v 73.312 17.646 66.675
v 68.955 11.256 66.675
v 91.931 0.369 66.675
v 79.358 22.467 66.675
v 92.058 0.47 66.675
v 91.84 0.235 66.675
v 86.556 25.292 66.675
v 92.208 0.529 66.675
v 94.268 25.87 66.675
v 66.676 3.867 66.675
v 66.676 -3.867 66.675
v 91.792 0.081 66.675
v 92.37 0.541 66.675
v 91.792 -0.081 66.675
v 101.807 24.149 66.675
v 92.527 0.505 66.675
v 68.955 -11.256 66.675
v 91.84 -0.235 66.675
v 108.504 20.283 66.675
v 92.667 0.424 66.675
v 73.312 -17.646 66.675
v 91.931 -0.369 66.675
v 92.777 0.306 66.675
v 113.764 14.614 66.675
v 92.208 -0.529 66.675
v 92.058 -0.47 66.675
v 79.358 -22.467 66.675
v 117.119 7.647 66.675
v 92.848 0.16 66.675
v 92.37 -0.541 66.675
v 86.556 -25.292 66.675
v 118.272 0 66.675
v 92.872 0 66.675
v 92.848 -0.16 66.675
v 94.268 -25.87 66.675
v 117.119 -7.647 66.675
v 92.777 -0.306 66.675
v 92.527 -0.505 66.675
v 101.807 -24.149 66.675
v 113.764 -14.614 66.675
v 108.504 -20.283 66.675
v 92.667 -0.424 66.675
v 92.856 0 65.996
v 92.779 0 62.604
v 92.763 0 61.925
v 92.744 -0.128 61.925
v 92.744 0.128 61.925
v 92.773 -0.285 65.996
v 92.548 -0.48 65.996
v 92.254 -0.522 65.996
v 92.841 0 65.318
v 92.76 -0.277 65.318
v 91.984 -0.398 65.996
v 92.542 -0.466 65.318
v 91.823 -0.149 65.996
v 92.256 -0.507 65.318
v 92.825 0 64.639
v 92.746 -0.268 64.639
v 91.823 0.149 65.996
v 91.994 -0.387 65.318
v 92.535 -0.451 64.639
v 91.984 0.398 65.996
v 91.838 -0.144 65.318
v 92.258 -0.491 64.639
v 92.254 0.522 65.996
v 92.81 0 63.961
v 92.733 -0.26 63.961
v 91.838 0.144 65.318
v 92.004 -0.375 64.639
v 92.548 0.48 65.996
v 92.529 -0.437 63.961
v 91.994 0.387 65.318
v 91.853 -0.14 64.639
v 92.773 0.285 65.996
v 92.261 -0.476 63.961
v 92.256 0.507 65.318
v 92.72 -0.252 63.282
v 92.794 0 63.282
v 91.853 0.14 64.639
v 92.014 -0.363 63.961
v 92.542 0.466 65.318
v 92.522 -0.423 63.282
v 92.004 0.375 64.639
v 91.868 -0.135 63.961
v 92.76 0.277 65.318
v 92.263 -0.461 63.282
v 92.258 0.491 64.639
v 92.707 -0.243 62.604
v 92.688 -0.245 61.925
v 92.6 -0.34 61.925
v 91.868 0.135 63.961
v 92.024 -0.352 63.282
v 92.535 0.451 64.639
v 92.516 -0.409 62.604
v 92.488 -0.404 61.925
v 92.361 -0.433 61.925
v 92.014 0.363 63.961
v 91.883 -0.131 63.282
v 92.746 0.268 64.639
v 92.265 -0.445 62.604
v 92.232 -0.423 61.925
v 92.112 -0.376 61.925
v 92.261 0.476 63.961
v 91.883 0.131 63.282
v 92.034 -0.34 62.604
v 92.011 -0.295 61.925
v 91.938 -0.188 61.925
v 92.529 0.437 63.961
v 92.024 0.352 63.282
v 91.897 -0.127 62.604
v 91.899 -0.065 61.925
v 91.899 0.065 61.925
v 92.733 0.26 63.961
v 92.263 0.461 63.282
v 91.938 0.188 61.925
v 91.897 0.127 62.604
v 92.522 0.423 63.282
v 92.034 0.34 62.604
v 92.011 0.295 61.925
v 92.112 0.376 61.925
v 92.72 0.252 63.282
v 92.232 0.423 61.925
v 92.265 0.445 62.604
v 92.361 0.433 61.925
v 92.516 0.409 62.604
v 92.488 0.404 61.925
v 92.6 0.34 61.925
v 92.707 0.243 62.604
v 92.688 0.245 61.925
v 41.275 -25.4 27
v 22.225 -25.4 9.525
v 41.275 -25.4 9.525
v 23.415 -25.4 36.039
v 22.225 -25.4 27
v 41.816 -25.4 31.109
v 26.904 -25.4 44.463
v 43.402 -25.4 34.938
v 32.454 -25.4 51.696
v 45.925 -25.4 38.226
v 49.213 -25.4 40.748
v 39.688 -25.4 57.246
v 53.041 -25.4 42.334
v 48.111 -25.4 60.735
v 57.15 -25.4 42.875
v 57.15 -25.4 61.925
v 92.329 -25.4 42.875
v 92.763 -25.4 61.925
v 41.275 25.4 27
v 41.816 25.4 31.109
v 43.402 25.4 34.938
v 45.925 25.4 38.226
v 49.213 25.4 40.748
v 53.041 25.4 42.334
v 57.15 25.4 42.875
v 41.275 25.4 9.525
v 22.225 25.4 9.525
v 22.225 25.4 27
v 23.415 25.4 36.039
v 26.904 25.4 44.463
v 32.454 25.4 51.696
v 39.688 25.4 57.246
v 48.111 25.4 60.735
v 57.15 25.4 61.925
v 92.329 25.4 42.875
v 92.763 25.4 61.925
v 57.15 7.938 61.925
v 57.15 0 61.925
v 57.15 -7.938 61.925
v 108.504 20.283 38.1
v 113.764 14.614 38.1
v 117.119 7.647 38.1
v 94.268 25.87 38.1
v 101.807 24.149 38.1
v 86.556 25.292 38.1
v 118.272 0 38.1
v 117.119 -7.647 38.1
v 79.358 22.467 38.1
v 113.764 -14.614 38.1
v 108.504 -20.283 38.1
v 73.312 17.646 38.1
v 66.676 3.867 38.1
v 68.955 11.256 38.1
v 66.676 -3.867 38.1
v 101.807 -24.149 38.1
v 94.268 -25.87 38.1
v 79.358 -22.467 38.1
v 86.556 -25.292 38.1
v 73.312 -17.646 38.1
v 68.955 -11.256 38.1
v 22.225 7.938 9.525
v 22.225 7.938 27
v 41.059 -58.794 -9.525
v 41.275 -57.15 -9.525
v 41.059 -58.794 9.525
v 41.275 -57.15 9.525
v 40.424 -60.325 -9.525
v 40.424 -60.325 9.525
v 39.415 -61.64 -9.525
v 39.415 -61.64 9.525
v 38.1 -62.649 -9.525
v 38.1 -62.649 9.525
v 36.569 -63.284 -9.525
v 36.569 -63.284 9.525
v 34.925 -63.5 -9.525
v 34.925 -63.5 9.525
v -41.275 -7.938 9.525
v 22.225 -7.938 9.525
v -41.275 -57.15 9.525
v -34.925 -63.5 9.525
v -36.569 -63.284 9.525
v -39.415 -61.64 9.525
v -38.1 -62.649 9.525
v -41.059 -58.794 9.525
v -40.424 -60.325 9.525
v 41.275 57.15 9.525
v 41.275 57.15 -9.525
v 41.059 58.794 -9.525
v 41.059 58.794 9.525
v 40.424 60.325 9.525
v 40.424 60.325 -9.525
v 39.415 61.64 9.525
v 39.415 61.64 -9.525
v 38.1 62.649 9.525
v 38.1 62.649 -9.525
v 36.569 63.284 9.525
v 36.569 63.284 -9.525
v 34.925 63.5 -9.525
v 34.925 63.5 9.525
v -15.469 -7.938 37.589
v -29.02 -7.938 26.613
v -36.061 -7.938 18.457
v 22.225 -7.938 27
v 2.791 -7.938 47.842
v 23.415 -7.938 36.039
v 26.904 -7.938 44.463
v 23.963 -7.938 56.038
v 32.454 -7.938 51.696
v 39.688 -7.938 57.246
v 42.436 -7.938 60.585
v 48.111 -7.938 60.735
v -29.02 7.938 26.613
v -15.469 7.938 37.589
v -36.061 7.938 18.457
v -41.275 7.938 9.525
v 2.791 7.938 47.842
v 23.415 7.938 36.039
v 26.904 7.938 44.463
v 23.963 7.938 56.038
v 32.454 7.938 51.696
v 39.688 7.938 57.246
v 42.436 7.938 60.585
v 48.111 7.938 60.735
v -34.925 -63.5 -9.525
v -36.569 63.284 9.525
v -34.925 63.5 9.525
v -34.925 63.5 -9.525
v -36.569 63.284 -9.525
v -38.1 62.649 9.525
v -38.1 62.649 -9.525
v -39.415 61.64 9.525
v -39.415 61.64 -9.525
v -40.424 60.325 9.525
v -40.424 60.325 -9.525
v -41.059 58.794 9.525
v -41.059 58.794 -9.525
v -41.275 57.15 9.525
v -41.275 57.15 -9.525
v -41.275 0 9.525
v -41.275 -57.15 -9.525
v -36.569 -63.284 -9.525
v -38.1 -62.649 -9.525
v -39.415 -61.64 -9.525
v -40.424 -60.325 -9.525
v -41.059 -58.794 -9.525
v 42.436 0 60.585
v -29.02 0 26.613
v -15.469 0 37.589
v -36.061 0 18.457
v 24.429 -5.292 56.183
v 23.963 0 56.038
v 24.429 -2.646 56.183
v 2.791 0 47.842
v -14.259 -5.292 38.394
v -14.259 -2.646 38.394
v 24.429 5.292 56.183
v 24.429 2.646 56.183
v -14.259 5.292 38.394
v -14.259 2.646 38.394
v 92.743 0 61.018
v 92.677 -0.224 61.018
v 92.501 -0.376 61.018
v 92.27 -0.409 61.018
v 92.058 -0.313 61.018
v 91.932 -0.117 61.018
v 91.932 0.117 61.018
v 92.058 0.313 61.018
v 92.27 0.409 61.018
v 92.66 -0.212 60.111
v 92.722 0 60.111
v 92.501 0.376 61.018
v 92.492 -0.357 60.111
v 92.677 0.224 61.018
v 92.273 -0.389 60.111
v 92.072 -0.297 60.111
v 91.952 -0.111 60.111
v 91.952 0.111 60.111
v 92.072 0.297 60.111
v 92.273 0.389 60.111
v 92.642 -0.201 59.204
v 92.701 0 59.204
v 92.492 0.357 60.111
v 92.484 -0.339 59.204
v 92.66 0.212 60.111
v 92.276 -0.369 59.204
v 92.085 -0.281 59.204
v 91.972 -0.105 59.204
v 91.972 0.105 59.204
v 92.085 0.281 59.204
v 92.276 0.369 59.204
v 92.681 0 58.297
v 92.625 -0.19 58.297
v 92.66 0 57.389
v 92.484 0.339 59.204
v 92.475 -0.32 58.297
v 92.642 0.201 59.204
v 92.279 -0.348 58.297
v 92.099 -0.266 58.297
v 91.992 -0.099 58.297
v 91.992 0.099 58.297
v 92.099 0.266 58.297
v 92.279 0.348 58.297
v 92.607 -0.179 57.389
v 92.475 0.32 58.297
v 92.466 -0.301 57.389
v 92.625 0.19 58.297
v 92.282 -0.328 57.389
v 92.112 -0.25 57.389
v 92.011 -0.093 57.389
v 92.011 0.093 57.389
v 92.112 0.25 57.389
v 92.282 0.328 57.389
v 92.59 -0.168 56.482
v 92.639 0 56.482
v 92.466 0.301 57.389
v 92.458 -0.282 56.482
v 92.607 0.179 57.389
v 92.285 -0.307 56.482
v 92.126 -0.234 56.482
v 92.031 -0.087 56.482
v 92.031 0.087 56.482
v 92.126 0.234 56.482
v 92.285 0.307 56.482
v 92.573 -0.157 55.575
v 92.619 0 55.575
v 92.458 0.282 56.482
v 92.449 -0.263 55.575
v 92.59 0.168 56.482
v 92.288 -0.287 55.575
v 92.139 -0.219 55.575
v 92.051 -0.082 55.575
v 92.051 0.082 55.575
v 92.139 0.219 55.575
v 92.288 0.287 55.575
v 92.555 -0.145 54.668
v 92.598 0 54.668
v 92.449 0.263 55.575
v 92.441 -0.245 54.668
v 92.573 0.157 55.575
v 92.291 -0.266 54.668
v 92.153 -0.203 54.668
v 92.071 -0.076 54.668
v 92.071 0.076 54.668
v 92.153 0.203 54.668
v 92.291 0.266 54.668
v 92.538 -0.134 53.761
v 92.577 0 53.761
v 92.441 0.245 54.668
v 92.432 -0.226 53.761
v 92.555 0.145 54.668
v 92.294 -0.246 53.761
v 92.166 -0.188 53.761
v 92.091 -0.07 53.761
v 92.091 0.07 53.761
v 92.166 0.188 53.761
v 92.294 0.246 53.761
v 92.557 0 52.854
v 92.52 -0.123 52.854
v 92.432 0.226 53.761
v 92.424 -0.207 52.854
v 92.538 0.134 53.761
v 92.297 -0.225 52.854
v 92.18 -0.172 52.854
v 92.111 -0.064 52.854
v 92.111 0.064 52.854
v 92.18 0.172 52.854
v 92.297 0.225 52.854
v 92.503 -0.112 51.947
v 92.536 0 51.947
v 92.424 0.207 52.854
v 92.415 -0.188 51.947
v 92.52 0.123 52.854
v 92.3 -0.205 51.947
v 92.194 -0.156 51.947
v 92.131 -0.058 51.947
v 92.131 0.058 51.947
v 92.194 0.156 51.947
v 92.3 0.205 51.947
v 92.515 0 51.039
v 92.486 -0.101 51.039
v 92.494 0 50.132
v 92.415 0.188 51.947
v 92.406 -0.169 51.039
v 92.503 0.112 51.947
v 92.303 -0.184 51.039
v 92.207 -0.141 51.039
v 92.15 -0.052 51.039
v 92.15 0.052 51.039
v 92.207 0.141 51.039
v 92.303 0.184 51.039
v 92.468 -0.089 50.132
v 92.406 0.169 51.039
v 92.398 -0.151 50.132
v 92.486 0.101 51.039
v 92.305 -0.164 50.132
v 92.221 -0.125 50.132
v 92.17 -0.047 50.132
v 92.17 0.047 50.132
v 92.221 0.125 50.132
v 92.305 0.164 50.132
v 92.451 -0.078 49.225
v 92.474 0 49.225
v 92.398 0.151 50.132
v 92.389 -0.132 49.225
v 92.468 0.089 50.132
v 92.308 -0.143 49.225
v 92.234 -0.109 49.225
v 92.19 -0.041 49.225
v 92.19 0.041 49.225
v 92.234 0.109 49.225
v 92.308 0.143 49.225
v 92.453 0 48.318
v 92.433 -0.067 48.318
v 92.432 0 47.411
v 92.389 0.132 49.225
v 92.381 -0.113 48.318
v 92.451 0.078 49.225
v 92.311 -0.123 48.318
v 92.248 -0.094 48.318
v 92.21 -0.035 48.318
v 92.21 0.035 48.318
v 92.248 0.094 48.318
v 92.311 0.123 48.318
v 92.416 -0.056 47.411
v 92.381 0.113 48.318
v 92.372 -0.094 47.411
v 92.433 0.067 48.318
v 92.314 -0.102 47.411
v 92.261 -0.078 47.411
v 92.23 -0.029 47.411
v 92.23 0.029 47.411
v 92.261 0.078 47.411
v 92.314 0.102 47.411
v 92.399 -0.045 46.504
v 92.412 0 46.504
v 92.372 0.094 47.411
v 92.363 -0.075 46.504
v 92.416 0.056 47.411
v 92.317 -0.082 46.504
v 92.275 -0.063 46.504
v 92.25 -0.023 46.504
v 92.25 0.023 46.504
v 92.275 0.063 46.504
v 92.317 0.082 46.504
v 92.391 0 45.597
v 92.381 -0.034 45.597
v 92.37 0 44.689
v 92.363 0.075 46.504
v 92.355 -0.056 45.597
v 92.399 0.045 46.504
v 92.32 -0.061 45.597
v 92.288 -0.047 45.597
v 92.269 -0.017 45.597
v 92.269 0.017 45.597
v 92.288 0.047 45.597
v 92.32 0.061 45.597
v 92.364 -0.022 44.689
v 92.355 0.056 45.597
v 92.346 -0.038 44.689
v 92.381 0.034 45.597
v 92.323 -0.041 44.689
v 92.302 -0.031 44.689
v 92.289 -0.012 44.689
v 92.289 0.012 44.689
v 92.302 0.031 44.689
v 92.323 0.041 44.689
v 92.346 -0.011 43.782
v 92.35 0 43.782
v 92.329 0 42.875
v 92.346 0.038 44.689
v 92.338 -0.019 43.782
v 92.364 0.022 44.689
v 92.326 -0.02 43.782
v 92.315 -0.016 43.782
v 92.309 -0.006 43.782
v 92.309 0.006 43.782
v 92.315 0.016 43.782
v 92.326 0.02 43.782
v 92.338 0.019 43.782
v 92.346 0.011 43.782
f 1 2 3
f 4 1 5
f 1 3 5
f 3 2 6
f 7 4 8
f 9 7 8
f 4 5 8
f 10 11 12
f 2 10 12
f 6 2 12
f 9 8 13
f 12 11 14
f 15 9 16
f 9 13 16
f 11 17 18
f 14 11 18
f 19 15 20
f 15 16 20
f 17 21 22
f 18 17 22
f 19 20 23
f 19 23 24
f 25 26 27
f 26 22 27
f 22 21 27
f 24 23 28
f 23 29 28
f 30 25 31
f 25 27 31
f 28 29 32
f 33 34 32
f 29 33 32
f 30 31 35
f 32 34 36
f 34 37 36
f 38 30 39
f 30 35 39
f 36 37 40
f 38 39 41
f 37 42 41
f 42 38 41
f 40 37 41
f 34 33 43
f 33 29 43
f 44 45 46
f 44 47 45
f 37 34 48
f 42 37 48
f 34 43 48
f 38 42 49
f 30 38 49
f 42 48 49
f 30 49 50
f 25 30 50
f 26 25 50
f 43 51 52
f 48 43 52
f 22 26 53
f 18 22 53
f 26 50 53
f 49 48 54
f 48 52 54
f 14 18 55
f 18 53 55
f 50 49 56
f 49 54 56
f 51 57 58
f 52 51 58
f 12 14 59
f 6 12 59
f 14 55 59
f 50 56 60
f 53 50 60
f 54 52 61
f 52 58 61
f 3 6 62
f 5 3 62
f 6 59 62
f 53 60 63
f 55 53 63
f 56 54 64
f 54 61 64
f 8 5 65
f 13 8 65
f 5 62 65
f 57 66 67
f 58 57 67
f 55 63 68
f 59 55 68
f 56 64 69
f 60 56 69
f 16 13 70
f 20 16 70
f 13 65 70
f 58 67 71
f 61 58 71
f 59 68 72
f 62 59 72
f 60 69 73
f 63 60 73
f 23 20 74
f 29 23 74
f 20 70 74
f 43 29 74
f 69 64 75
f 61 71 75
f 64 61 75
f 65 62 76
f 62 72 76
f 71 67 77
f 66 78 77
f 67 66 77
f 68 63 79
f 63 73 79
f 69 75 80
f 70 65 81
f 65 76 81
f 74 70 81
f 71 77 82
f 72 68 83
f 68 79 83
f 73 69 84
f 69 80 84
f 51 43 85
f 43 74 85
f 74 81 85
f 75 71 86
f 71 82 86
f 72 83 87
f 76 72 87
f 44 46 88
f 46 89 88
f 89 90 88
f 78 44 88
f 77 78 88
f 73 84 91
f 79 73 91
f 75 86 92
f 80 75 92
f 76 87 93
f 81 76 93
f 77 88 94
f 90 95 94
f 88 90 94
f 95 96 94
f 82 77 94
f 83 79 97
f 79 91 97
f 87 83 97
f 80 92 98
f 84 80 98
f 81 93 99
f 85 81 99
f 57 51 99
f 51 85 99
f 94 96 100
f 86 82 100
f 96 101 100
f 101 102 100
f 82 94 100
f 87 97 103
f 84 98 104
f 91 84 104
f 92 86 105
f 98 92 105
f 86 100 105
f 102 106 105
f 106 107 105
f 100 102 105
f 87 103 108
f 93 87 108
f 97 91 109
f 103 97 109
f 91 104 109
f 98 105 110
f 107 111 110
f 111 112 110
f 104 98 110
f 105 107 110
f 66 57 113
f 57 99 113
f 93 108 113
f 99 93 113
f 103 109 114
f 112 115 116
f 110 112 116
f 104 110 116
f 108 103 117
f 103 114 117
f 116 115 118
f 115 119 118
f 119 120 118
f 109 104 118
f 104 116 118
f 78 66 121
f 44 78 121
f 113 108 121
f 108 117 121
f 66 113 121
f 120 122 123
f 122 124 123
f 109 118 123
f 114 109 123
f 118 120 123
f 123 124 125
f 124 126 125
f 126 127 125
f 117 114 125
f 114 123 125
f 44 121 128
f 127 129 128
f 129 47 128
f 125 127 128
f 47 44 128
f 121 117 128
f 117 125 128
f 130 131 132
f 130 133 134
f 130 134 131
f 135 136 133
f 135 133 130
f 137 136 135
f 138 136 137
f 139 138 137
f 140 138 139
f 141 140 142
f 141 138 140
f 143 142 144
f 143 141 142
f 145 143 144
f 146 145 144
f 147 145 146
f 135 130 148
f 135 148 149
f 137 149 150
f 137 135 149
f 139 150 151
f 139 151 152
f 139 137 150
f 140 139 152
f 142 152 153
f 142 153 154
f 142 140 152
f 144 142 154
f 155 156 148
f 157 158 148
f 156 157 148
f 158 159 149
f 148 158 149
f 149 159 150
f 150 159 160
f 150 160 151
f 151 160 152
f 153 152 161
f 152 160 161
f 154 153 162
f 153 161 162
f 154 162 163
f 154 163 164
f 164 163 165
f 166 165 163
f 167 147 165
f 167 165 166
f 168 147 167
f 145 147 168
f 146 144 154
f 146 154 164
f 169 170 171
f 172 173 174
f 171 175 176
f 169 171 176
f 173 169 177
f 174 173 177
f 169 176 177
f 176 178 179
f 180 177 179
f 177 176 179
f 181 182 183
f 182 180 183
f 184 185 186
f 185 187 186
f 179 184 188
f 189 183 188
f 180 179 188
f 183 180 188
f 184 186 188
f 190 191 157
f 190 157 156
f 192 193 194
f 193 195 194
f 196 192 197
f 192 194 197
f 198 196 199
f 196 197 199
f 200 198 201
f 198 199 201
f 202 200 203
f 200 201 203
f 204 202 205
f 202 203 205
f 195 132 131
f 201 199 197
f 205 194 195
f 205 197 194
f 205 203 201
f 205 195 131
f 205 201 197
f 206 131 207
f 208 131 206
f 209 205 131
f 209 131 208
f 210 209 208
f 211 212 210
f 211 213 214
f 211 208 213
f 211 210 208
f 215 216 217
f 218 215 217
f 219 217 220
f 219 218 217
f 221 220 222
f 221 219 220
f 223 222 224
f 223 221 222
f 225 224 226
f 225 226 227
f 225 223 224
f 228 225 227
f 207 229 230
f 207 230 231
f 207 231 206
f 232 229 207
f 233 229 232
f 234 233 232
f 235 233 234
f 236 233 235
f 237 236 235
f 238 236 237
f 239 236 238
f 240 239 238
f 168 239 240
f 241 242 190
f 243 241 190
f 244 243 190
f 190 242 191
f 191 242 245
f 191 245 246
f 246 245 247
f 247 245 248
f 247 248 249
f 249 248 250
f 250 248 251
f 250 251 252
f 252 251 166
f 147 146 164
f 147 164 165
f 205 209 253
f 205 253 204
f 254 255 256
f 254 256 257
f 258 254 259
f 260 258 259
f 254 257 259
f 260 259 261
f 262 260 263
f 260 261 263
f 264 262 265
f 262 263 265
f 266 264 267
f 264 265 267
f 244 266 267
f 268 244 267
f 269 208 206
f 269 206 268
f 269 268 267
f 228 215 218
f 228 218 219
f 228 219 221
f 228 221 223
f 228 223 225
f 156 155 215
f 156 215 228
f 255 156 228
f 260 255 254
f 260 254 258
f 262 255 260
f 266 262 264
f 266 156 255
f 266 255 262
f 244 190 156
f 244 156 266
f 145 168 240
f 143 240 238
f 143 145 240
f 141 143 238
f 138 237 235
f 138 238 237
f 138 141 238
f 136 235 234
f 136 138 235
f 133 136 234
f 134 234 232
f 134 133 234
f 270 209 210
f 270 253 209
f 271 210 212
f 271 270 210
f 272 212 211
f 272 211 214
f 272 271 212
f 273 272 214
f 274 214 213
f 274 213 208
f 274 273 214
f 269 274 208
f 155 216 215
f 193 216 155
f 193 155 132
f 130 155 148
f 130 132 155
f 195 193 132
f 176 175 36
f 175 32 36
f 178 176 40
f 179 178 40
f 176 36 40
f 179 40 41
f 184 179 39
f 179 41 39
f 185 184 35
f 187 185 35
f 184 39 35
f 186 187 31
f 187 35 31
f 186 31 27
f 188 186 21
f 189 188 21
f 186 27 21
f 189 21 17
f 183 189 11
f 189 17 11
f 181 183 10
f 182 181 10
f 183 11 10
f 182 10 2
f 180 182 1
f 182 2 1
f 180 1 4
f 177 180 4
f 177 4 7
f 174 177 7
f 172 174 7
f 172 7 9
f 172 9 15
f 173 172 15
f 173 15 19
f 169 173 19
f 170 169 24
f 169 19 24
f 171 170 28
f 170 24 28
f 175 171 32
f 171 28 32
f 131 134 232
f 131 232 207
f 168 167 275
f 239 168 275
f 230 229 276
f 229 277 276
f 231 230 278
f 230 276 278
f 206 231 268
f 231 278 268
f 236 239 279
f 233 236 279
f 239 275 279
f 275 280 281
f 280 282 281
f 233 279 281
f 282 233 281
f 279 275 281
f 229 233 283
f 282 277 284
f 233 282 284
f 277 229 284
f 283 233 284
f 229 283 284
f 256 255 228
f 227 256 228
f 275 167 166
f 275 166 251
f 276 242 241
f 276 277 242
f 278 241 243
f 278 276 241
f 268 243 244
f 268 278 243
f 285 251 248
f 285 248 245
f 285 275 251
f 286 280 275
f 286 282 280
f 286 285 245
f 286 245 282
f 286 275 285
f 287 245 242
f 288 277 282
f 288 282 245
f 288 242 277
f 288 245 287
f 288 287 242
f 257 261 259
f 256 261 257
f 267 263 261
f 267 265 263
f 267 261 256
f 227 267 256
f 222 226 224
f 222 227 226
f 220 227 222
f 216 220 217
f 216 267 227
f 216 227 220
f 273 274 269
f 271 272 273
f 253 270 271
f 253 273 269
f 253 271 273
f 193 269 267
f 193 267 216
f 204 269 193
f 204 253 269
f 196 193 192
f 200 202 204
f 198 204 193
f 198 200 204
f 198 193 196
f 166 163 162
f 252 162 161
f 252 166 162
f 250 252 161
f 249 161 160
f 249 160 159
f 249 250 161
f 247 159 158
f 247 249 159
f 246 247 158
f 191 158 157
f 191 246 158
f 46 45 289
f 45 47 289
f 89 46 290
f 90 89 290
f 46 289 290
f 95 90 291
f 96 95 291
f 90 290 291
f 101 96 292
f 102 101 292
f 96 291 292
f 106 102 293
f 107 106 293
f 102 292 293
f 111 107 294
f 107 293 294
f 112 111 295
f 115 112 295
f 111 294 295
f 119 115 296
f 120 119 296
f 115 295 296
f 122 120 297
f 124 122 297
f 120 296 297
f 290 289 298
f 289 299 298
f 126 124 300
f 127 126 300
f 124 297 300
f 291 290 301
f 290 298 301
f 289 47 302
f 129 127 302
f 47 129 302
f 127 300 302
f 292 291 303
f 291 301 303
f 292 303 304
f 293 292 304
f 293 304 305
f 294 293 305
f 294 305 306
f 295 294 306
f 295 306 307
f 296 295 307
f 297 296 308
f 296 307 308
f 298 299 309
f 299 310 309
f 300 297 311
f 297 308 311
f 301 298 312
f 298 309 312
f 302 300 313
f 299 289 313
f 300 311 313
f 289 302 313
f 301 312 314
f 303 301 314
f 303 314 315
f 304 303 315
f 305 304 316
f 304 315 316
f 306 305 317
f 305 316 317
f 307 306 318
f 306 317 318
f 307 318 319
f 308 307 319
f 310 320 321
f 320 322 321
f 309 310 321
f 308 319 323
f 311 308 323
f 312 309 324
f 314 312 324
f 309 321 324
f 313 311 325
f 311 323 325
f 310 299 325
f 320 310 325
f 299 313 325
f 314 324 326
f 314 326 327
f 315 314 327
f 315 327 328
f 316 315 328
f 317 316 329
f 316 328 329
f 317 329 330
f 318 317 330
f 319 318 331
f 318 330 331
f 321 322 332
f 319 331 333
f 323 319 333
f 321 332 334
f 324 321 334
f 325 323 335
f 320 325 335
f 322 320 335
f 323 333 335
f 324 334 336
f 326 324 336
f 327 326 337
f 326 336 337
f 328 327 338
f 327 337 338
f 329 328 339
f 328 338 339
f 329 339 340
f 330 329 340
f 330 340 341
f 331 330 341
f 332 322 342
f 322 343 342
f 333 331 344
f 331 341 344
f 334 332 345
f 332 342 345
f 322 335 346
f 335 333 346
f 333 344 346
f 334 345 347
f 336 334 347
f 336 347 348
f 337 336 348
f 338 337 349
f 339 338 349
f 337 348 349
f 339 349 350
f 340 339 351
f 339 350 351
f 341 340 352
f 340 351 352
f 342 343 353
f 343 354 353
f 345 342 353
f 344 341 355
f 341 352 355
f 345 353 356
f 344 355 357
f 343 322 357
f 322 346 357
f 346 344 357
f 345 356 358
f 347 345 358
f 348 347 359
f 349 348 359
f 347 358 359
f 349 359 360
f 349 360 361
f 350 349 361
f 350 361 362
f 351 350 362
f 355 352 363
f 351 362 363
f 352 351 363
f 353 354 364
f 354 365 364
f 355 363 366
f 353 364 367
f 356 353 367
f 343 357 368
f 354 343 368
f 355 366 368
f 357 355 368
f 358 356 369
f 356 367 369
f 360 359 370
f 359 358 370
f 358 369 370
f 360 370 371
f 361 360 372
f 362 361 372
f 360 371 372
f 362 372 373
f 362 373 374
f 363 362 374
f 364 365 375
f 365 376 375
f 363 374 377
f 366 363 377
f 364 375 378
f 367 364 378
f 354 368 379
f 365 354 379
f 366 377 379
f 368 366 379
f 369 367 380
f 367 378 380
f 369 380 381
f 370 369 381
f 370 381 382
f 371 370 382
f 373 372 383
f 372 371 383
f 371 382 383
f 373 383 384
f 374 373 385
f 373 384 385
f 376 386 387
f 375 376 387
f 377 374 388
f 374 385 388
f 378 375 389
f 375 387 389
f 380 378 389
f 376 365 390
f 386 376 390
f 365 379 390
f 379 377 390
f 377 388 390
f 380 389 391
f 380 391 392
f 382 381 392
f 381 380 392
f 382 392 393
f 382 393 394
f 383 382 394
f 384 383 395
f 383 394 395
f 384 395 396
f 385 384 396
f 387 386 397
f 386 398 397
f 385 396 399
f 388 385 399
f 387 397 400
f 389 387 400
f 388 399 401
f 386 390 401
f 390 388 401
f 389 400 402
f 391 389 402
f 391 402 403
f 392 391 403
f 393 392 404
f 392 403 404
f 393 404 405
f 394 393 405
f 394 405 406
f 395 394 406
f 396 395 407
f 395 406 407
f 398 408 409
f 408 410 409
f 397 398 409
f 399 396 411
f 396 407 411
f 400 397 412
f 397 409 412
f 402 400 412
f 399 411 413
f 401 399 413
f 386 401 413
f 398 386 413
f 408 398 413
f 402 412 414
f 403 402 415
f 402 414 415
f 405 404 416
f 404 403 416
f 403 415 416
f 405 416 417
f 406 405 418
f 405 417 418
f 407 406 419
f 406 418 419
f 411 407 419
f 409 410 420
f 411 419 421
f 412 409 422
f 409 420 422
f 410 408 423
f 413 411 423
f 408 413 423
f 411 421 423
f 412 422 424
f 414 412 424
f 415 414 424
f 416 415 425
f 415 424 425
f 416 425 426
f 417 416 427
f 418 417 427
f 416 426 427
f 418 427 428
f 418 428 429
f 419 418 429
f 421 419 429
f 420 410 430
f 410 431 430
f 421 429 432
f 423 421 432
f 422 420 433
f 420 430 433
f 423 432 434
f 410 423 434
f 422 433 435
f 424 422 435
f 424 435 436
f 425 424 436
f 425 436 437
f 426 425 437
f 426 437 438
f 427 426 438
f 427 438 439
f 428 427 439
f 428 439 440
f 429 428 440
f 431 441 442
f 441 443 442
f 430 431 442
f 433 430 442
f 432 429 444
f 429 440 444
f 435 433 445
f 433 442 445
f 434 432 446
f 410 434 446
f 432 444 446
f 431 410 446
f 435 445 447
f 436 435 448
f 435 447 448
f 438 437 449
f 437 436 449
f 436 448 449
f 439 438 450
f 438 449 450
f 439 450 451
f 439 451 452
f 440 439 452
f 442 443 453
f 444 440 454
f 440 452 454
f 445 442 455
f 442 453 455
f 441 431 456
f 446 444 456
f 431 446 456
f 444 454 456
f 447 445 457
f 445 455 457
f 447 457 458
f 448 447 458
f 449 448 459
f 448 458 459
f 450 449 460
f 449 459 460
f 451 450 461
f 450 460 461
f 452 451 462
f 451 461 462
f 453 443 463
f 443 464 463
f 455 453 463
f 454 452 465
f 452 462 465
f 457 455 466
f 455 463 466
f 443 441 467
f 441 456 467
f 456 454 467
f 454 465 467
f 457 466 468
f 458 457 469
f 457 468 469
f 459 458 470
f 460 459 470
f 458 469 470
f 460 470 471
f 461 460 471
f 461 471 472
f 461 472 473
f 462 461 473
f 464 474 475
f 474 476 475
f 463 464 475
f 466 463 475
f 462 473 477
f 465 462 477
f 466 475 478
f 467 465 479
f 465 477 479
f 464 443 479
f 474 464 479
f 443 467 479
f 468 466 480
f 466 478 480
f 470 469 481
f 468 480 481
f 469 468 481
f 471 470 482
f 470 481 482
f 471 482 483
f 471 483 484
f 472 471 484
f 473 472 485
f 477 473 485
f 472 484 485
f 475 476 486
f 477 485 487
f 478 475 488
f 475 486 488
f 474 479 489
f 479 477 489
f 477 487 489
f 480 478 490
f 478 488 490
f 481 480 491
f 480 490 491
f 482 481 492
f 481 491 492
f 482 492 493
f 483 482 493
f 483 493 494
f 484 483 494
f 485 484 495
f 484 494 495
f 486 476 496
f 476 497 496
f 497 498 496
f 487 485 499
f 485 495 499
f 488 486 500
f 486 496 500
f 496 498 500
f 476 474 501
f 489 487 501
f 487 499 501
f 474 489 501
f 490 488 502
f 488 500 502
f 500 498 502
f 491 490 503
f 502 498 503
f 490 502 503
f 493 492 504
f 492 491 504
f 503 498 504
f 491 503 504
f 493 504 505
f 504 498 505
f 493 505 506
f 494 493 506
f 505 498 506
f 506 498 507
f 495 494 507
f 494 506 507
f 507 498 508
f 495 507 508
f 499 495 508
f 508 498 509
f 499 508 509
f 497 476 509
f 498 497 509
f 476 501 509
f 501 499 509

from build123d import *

# Parameters (mm, degrees)
F1_DEPTH = 63.5
F2_DEPTH = 25.4
F3_DEPTH = 7.9375
F5_R     = 6.35


with BuildPart() as f1:
    # F0 (on Front) → F1 (new body, symmetric)
    with BuildSketch(Plane.XZ):
        Polygon((41.275, -9.525), (41.275, 9.525), (22.225, 9.525), (-41.275, 9.525), (-41.275, -9.525), align=None)
    extrude(amount=F1_DEPTH, both=True)

    # F0 (on Front) → F2 (join, symmetric)
    with BuildSketch(Plane.XZ):
        with BuildLine():
            Line((22.225, 9.525), (41.275, 9.525))
            Line((41.275, 9.525), (41.275, 27.0002))
            ThreePointArc((41.275, 27.0002), (45.9246798487, 38.2255201513), (57.15, 42.8752))
            Line((57.15, 42.8752), (67.4716901156, 42.8752))
            Line((67.4716901156, 42.8752), (67.4716901156, 61.9252))
            Line((67.4716901156, 61.9252), (57.15, 61.9252))
            ThreePointArc((57.15, 61.9252), (32.4542956671, 51.6959043329), (22.225, 27.0002))
            Line((22.225, 27.0002), (22.225, 9.525))
        make_face()
        Polygon((67.4716901156, 61.9252), (67.4716901156, 42.8752), (92.329, 42.8752), (92.7633837638, 61.9252), align=None)
    extrude(amount=F2_DEPTH, both=True)

    # F0 (on Front) → F3 (join, symmetric)
    with BuildSketch(Plane.XZ):
        with BuildLine():
            Line((-41.275, 9.525), (22.225, 9.525))
            Line((22.225, 9.525), (22.225, 27.0002))
            ThreePointArc((22.225, 27.0002), (32.4542956671, 51.6959043329), (57.15, 61.9252))
            add(Edge.make_bspline(
                [(57.15, 61.9252), (33.2918353379, 62.5275820494), (-25.9740035981, 43.6129495502), (-41.275, 9.525)],
                knots=[0, 0, 0, 0, 111.5045361635, 111.5045361635, 111.5045361635, 111.5045361635], degree=3))
        make_face()
    extrude(amount=F3_DEPTH, both=True)

    # F5
    f5_edges = [f1.edges().sort_by_distance(p)[0] for p in [
        (41.275, -63.5, 0),
        (-41.275, -63.5, 0),
        (-41.275, 63.5, 0),
        (41.275, 63.5, 0),
    ]]
    fillet(f5_edges, radius=F5_R)


with BuildPart() as f4:
    # F0 (on Front) → F4 (revolve)
    with BuildSketch(Plane.XZ):
        Polygon((92.7633837638, 61.9252), (92.329, 42.8752), (92.329, 38.1), (118.2716901156, 38.1), (118.2716901156, 66.675), (92.8716901156, 66.675), align=None)
    revolve(axis=Axis((92.329, 0, 40.4876), (0, 0, -1)))


solid = Compound([f1.part, f4.part])
